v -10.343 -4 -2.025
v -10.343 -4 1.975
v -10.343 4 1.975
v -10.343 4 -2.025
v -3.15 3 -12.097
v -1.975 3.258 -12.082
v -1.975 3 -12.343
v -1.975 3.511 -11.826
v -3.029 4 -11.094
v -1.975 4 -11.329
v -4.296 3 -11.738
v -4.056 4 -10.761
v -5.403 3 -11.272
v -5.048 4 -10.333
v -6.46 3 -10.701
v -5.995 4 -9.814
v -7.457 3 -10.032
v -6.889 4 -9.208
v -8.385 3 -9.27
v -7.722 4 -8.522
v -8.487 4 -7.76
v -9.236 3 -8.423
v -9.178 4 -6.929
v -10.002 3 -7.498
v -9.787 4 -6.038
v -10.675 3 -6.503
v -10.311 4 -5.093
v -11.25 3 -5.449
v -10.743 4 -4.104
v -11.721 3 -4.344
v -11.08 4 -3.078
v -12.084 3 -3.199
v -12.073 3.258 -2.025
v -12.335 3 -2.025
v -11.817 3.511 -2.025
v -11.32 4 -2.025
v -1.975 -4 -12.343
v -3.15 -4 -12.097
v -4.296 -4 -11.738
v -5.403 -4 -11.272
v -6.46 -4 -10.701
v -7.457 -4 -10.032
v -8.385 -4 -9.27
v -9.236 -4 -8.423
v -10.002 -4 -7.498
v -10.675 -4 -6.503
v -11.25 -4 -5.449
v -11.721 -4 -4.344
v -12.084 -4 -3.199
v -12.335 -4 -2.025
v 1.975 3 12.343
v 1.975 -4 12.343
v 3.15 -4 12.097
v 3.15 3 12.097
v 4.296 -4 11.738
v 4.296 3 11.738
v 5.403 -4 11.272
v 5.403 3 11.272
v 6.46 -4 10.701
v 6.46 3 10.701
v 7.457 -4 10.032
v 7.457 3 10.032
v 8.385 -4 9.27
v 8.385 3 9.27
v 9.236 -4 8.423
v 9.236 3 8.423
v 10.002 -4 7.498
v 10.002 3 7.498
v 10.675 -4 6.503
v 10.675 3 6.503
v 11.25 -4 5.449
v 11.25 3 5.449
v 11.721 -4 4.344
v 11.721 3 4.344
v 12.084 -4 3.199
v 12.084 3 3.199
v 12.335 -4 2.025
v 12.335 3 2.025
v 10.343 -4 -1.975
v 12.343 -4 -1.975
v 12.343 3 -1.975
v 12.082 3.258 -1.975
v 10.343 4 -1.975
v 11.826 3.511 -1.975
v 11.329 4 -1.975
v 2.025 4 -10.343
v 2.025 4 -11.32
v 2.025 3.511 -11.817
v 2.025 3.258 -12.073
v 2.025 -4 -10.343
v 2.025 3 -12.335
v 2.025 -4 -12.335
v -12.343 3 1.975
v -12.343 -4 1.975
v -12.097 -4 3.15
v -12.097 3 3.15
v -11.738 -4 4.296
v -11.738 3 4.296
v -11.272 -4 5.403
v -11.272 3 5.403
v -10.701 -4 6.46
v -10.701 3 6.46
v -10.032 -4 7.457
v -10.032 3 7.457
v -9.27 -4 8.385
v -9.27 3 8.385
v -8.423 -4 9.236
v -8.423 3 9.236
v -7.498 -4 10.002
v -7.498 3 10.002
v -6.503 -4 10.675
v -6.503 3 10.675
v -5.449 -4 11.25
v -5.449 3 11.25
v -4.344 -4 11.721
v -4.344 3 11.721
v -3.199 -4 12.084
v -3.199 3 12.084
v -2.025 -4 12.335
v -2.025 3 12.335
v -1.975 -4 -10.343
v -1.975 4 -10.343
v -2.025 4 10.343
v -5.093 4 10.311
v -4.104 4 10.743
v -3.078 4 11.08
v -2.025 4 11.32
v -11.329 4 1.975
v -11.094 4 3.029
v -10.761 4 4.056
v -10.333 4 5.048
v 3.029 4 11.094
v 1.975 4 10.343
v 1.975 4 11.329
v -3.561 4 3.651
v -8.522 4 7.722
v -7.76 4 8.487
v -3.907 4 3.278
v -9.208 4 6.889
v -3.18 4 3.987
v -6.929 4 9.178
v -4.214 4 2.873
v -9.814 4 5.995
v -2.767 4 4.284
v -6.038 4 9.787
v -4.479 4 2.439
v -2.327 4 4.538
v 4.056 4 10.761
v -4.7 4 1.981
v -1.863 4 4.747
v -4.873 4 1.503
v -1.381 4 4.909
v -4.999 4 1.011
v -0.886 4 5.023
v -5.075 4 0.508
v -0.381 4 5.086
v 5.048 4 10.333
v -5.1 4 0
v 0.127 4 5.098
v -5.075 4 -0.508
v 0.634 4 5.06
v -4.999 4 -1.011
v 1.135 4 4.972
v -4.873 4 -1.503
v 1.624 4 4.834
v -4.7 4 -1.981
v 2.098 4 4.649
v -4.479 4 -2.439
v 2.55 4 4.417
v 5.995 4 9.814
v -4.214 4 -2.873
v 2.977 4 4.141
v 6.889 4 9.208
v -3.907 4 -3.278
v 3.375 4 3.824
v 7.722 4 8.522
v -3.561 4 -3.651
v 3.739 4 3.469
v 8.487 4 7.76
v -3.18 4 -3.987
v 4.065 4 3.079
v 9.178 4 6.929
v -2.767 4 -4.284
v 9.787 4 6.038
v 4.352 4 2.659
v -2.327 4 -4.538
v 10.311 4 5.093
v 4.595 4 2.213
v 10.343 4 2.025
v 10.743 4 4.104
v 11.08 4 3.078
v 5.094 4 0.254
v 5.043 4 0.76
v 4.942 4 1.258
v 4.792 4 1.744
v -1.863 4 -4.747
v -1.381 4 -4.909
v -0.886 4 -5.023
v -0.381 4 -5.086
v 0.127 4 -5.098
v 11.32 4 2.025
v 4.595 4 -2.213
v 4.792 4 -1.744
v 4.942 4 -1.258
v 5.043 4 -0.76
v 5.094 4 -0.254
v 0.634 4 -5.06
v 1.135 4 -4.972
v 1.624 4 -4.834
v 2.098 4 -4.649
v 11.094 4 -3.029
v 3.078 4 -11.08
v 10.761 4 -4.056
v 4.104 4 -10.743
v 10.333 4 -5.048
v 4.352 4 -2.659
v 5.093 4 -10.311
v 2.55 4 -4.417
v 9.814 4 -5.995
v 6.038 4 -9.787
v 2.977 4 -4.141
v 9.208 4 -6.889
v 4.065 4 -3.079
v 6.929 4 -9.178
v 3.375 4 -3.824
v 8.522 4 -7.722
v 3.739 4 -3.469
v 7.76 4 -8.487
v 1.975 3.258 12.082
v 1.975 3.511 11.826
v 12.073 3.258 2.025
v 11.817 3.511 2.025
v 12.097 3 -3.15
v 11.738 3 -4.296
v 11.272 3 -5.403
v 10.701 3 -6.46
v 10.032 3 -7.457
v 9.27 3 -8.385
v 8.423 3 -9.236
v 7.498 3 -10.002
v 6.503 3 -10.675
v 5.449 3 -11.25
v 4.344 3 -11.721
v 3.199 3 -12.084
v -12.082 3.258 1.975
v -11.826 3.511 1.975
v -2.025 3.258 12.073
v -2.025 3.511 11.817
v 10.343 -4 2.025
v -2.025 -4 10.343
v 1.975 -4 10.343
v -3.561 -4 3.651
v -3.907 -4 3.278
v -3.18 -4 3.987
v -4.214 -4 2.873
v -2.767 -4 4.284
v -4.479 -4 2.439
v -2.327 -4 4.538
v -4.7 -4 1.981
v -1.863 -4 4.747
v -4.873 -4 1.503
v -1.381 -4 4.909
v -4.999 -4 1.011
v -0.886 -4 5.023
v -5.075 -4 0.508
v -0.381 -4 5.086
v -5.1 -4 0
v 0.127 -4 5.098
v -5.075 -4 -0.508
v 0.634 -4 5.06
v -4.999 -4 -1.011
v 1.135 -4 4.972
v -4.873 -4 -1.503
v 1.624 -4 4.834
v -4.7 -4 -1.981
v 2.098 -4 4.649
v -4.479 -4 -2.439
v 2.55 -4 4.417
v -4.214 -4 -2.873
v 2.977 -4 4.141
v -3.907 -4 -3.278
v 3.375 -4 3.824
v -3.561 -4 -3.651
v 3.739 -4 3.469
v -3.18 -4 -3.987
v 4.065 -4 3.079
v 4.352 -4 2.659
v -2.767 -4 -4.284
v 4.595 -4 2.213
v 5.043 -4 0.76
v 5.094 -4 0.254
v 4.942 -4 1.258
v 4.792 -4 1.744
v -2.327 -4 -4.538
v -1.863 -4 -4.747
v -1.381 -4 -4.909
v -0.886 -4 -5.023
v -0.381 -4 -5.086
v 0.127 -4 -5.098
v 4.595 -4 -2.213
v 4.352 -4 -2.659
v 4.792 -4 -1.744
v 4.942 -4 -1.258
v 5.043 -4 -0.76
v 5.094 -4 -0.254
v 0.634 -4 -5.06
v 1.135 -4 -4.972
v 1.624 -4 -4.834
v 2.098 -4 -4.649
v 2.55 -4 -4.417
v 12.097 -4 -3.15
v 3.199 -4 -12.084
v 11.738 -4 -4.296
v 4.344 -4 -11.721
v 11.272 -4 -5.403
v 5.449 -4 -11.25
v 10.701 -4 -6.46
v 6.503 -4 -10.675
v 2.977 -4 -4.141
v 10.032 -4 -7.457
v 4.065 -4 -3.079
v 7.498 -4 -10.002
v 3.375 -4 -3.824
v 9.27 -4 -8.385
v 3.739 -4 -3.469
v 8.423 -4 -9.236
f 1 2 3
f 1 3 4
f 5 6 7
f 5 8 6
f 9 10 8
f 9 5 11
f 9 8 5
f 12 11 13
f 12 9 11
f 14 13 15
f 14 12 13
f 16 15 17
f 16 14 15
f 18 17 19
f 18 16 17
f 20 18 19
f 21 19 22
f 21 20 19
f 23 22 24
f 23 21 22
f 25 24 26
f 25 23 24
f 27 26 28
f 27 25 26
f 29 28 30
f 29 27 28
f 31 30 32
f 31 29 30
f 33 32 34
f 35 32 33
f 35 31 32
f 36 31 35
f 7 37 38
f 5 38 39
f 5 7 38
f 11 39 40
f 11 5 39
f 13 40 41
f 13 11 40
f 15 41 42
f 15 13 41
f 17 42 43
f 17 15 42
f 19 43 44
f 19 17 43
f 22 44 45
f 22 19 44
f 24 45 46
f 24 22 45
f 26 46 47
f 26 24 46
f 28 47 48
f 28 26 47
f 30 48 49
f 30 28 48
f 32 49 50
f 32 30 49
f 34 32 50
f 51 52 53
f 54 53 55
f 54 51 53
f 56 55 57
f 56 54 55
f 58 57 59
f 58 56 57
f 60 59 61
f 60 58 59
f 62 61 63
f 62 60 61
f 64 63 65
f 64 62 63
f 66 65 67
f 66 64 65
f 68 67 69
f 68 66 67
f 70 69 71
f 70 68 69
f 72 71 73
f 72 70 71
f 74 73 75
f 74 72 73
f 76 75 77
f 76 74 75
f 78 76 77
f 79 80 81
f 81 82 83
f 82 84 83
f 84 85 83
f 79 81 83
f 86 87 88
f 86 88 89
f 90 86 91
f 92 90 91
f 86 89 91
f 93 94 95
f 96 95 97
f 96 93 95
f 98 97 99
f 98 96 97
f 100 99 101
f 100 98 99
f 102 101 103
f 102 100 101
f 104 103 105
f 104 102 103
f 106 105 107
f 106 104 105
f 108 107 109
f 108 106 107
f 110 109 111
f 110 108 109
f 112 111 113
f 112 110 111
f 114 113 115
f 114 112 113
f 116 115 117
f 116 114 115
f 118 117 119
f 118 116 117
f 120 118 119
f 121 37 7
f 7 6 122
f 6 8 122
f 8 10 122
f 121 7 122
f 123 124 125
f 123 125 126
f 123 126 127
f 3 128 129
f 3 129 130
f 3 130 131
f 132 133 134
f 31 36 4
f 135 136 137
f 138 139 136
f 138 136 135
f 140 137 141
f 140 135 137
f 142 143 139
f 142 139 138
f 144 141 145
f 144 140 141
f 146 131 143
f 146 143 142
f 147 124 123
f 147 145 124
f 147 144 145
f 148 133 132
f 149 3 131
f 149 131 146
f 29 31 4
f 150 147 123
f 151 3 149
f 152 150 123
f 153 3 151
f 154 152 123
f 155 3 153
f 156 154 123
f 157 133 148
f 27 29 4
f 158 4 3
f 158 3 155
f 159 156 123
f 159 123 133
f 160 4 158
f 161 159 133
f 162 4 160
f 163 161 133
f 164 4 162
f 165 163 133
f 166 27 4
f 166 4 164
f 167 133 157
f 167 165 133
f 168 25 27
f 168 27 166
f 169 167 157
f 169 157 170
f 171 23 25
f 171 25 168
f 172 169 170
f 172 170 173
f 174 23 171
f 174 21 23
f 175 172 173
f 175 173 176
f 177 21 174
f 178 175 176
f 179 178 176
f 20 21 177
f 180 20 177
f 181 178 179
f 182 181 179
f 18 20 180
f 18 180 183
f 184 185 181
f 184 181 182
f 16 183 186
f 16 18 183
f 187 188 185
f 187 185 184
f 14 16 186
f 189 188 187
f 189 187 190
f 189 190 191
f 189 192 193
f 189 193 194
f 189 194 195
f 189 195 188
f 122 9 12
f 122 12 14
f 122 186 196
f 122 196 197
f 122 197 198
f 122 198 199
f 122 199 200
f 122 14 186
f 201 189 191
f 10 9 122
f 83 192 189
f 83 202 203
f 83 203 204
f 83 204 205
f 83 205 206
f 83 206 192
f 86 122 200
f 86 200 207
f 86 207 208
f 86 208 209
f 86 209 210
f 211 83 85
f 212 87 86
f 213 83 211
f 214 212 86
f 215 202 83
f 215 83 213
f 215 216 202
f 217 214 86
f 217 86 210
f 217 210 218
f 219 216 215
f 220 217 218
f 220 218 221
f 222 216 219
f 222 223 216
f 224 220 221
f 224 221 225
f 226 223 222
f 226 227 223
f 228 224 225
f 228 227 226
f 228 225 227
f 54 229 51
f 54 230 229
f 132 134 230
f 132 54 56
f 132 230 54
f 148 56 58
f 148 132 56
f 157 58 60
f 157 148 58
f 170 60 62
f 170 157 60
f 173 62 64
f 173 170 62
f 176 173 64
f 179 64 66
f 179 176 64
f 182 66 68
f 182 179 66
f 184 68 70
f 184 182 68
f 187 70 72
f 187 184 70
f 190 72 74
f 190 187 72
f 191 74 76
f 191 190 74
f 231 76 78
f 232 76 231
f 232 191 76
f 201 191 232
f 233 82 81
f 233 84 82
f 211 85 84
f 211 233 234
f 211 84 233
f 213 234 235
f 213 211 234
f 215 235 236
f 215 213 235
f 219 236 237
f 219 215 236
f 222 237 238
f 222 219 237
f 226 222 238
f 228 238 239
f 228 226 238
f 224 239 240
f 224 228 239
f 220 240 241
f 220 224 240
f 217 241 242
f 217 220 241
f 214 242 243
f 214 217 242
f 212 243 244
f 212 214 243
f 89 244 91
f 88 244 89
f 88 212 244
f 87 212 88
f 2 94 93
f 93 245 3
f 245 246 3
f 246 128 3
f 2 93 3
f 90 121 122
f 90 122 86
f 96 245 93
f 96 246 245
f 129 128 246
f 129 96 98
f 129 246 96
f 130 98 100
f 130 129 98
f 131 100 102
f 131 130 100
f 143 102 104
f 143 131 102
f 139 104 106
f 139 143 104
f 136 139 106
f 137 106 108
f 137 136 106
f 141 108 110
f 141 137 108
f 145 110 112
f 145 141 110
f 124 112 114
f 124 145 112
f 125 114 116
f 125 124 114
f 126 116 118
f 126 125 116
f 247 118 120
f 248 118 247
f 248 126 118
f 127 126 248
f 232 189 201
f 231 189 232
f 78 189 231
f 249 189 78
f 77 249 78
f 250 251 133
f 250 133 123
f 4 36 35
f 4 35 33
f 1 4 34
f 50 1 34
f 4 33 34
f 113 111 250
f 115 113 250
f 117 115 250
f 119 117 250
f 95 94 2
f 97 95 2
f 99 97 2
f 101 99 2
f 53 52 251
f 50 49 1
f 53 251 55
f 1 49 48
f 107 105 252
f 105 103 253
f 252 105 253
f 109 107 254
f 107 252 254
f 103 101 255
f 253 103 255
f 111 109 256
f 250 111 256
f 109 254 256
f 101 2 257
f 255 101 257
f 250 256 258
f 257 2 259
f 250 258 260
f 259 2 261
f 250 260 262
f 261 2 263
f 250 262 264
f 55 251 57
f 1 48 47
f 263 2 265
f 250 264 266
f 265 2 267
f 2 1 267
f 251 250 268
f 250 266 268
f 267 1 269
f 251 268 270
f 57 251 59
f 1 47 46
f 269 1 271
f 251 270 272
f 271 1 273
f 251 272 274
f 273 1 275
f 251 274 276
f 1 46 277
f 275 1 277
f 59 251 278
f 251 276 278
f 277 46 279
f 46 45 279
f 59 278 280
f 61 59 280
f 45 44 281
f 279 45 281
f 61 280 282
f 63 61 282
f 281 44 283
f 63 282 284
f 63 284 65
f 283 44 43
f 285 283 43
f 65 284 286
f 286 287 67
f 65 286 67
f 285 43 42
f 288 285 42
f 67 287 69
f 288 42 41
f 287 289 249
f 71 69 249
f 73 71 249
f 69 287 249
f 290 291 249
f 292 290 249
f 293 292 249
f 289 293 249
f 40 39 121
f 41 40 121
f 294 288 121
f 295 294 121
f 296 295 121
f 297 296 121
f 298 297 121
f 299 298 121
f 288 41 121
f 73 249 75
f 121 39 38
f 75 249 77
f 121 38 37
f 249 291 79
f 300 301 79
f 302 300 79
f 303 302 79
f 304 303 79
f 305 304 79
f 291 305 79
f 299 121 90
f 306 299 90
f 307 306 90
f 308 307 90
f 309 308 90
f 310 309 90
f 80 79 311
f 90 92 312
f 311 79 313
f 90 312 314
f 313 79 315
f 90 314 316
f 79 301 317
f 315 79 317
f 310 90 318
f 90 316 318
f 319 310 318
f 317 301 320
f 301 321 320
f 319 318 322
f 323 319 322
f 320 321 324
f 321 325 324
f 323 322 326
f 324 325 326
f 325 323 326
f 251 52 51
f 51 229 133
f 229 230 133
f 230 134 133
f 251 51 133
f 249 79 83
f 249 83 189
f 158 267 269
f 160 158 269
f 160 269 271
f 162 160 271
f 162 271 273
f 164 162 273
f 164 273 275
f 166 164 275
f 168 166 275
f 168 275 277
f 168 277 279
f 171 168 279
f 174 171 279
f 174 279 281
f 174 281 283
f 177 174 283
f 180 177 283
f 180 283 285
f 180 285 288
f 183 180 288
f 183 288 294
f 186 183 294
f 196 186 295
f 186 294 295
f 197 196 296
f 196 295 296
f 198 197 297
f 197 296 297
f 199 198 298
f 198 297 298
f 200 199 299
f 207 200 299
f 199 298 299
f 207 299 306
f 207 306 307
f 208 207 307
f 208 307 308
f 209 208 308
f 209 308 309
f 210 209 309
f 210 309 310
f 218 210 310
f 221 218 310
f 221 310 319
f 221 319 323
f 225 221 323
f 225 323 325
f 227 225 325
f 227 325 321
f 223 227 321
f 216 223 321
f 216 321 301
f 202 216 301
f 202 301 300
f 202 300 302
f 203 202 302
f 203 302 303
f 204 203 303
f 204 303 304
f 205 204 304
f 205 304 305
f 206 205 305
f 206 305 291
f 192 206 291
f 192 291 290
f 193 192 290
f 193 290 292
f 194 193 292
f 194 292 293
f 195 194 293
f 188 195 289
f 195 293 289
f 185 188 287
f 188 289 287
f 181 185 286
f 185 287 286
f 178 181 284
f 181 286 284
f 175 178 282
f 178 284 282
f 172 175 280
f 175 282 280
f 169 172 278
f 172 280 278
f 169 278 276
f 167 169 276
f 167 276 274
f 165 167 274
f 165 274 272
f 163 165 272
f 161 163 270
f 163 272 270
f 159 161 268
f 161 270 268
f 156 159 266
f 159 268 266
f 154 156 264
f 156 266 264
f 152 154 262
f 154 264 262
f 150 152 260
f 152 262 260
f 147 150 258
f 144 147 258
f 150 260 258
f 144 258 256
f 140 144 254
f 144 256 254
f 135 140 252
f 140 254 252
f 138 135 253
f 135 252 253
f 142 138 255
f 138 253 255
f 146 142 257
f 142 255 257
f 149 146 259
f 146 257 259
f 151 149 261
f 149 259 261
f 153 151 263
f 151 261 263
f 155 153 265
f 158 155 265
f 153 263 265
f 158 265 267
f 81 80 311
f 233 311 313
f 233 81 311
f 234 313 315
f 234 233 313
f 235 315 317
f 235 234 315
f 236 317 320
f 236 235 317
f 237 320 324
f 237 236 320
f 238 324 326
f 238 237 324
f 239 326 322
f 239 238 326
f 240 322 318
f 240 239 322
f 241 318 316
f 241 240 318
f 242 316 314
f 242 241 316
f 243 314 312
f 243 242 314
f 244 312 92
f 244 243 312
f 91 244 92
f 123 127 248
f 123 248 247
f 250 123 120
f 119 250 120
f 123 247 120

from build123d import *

# Parameters (mm, degrees)
SKETCH1_R               = 12.5
BOSS_EXTRUDE1_DEPTH     = 4
CUT_EXTRUDE1_DEPTH      = 5
CUT_EXTRUDE1_DEPTH_BACK = 5
CHAMFER1_SIZE           = 1
M12_TAPPED_HOLE1_D      = 10.2
M12_TAPPED_HOLE1_DEPTH  = 8


with BuildPart() as part:
    # Sketch1 → Boss-Extrude1 (new body, symmetric)
    with BuildSketch(Plane(origin=(0, 0, 0), x_dir=(1, 0, 0), z_dir=(0, 1, 0))):
        Circle(SKETCH1_R)
    extrude(amount=BOSS_EXTRUDE1_DEPTH, both=True)

    # Sketch2 → Cut-Extrude1 (cut, two sides)
    with BuildSketch(Plane(origin=(0, 0, 0), x_dir=(1, 0, 0), z_dir=(0, 1, 0))) as cut_extrude1_sk:
        with BuildLine():
            ThreePointArc((12.334864981, -2.025118736), (12.499974099, -0.025446565), (12.343007899, 1.974881264))
            Line((12.343007899, 1.974881264), (10.343007899, 1.974881264))
            Line((10.343007899, 1.974881264), (10.343007899, -2.025118736))
            Line((10.343007899, -2.025118736), (12.334864981, -2.025118736))
        make_face()
        with BuildLine():
            ThreePointArc((-2.025118736, -12.334864981), (-0.025446565, -12.499974099), (1.974881264, -12.343007899))
            Line((1.974881264, -12.343007899), (1.974881264, -10.343007899))
            Line((1.974881264, -10.343007899), (-2.025118736, -10.343007899))
            Line((-2.025118736, -10.343007899), (-2.025118736, -12.334864981))
        make_face()
        with BuildLine():
            Line((2.025118736, 10.343007899), (2.025118736, 12.334864981))
            ThreePointArc((2.025118736, 12.334864981), (0.025446565, 12.499974099), (-1.974881264, 12.343007899))
            Line((-1.974881264, 12.343007899), (-1.974881264, 10.343007899))
            Line((-1.974881264, 10.343007899), (2.025118736, 10.343007899))
        make_face()
        with BuildLine():
            ThreePointArc((-12.334864981, 2.025118736), (-12.499974099, 0.025446565), (-12.343007899, -1.974881264))
            Line((-12.343007899, -1.974881264), (-10.343007899, -1.974881264))
            Line((-10.343007899, -1.974881264), (-10.343007899, 2.025118736))
            Line((-10.343007899, 2.025118736), (-12.334864981, 2.025118736))
        make_face()
    extrude(amount=CUT_EXTRUDE1_DEPTH, mode=Mode.SUBTRACT)
    extrude(cut_extrude1_sk.sketch, amount=-CUT_EXTRUDE1_DEPTH_BACK, mode=Mode.SUBTRACT)

    # Chamfer1
    chamfer1_edges = [part.edges().sort_by_distance(p)[0] for p in [
        (8.856809889, 4, -8.820823011),
        (-8.820823011, 4, -8.856809889),
        (-8.856809889, 4, 8.820823011),
        (8.820823011, 4, 8.856809889),
    ]]
    chamfer(chamfer1_edges, length=CHAMFER1_SIZE)

    # M12 Tapped Hole1
    with Locations(Plane(origin=(0, 4, 0), x_dir=(1, 0, 0), z_dir=(0, 1, 0))):
        with Locations((0, 0)):
            Hole(M12_TAPPED_HOLE1_D / 2, depth=M12_TAPPED_HOLE1_DEPTH)


solid = part.part
